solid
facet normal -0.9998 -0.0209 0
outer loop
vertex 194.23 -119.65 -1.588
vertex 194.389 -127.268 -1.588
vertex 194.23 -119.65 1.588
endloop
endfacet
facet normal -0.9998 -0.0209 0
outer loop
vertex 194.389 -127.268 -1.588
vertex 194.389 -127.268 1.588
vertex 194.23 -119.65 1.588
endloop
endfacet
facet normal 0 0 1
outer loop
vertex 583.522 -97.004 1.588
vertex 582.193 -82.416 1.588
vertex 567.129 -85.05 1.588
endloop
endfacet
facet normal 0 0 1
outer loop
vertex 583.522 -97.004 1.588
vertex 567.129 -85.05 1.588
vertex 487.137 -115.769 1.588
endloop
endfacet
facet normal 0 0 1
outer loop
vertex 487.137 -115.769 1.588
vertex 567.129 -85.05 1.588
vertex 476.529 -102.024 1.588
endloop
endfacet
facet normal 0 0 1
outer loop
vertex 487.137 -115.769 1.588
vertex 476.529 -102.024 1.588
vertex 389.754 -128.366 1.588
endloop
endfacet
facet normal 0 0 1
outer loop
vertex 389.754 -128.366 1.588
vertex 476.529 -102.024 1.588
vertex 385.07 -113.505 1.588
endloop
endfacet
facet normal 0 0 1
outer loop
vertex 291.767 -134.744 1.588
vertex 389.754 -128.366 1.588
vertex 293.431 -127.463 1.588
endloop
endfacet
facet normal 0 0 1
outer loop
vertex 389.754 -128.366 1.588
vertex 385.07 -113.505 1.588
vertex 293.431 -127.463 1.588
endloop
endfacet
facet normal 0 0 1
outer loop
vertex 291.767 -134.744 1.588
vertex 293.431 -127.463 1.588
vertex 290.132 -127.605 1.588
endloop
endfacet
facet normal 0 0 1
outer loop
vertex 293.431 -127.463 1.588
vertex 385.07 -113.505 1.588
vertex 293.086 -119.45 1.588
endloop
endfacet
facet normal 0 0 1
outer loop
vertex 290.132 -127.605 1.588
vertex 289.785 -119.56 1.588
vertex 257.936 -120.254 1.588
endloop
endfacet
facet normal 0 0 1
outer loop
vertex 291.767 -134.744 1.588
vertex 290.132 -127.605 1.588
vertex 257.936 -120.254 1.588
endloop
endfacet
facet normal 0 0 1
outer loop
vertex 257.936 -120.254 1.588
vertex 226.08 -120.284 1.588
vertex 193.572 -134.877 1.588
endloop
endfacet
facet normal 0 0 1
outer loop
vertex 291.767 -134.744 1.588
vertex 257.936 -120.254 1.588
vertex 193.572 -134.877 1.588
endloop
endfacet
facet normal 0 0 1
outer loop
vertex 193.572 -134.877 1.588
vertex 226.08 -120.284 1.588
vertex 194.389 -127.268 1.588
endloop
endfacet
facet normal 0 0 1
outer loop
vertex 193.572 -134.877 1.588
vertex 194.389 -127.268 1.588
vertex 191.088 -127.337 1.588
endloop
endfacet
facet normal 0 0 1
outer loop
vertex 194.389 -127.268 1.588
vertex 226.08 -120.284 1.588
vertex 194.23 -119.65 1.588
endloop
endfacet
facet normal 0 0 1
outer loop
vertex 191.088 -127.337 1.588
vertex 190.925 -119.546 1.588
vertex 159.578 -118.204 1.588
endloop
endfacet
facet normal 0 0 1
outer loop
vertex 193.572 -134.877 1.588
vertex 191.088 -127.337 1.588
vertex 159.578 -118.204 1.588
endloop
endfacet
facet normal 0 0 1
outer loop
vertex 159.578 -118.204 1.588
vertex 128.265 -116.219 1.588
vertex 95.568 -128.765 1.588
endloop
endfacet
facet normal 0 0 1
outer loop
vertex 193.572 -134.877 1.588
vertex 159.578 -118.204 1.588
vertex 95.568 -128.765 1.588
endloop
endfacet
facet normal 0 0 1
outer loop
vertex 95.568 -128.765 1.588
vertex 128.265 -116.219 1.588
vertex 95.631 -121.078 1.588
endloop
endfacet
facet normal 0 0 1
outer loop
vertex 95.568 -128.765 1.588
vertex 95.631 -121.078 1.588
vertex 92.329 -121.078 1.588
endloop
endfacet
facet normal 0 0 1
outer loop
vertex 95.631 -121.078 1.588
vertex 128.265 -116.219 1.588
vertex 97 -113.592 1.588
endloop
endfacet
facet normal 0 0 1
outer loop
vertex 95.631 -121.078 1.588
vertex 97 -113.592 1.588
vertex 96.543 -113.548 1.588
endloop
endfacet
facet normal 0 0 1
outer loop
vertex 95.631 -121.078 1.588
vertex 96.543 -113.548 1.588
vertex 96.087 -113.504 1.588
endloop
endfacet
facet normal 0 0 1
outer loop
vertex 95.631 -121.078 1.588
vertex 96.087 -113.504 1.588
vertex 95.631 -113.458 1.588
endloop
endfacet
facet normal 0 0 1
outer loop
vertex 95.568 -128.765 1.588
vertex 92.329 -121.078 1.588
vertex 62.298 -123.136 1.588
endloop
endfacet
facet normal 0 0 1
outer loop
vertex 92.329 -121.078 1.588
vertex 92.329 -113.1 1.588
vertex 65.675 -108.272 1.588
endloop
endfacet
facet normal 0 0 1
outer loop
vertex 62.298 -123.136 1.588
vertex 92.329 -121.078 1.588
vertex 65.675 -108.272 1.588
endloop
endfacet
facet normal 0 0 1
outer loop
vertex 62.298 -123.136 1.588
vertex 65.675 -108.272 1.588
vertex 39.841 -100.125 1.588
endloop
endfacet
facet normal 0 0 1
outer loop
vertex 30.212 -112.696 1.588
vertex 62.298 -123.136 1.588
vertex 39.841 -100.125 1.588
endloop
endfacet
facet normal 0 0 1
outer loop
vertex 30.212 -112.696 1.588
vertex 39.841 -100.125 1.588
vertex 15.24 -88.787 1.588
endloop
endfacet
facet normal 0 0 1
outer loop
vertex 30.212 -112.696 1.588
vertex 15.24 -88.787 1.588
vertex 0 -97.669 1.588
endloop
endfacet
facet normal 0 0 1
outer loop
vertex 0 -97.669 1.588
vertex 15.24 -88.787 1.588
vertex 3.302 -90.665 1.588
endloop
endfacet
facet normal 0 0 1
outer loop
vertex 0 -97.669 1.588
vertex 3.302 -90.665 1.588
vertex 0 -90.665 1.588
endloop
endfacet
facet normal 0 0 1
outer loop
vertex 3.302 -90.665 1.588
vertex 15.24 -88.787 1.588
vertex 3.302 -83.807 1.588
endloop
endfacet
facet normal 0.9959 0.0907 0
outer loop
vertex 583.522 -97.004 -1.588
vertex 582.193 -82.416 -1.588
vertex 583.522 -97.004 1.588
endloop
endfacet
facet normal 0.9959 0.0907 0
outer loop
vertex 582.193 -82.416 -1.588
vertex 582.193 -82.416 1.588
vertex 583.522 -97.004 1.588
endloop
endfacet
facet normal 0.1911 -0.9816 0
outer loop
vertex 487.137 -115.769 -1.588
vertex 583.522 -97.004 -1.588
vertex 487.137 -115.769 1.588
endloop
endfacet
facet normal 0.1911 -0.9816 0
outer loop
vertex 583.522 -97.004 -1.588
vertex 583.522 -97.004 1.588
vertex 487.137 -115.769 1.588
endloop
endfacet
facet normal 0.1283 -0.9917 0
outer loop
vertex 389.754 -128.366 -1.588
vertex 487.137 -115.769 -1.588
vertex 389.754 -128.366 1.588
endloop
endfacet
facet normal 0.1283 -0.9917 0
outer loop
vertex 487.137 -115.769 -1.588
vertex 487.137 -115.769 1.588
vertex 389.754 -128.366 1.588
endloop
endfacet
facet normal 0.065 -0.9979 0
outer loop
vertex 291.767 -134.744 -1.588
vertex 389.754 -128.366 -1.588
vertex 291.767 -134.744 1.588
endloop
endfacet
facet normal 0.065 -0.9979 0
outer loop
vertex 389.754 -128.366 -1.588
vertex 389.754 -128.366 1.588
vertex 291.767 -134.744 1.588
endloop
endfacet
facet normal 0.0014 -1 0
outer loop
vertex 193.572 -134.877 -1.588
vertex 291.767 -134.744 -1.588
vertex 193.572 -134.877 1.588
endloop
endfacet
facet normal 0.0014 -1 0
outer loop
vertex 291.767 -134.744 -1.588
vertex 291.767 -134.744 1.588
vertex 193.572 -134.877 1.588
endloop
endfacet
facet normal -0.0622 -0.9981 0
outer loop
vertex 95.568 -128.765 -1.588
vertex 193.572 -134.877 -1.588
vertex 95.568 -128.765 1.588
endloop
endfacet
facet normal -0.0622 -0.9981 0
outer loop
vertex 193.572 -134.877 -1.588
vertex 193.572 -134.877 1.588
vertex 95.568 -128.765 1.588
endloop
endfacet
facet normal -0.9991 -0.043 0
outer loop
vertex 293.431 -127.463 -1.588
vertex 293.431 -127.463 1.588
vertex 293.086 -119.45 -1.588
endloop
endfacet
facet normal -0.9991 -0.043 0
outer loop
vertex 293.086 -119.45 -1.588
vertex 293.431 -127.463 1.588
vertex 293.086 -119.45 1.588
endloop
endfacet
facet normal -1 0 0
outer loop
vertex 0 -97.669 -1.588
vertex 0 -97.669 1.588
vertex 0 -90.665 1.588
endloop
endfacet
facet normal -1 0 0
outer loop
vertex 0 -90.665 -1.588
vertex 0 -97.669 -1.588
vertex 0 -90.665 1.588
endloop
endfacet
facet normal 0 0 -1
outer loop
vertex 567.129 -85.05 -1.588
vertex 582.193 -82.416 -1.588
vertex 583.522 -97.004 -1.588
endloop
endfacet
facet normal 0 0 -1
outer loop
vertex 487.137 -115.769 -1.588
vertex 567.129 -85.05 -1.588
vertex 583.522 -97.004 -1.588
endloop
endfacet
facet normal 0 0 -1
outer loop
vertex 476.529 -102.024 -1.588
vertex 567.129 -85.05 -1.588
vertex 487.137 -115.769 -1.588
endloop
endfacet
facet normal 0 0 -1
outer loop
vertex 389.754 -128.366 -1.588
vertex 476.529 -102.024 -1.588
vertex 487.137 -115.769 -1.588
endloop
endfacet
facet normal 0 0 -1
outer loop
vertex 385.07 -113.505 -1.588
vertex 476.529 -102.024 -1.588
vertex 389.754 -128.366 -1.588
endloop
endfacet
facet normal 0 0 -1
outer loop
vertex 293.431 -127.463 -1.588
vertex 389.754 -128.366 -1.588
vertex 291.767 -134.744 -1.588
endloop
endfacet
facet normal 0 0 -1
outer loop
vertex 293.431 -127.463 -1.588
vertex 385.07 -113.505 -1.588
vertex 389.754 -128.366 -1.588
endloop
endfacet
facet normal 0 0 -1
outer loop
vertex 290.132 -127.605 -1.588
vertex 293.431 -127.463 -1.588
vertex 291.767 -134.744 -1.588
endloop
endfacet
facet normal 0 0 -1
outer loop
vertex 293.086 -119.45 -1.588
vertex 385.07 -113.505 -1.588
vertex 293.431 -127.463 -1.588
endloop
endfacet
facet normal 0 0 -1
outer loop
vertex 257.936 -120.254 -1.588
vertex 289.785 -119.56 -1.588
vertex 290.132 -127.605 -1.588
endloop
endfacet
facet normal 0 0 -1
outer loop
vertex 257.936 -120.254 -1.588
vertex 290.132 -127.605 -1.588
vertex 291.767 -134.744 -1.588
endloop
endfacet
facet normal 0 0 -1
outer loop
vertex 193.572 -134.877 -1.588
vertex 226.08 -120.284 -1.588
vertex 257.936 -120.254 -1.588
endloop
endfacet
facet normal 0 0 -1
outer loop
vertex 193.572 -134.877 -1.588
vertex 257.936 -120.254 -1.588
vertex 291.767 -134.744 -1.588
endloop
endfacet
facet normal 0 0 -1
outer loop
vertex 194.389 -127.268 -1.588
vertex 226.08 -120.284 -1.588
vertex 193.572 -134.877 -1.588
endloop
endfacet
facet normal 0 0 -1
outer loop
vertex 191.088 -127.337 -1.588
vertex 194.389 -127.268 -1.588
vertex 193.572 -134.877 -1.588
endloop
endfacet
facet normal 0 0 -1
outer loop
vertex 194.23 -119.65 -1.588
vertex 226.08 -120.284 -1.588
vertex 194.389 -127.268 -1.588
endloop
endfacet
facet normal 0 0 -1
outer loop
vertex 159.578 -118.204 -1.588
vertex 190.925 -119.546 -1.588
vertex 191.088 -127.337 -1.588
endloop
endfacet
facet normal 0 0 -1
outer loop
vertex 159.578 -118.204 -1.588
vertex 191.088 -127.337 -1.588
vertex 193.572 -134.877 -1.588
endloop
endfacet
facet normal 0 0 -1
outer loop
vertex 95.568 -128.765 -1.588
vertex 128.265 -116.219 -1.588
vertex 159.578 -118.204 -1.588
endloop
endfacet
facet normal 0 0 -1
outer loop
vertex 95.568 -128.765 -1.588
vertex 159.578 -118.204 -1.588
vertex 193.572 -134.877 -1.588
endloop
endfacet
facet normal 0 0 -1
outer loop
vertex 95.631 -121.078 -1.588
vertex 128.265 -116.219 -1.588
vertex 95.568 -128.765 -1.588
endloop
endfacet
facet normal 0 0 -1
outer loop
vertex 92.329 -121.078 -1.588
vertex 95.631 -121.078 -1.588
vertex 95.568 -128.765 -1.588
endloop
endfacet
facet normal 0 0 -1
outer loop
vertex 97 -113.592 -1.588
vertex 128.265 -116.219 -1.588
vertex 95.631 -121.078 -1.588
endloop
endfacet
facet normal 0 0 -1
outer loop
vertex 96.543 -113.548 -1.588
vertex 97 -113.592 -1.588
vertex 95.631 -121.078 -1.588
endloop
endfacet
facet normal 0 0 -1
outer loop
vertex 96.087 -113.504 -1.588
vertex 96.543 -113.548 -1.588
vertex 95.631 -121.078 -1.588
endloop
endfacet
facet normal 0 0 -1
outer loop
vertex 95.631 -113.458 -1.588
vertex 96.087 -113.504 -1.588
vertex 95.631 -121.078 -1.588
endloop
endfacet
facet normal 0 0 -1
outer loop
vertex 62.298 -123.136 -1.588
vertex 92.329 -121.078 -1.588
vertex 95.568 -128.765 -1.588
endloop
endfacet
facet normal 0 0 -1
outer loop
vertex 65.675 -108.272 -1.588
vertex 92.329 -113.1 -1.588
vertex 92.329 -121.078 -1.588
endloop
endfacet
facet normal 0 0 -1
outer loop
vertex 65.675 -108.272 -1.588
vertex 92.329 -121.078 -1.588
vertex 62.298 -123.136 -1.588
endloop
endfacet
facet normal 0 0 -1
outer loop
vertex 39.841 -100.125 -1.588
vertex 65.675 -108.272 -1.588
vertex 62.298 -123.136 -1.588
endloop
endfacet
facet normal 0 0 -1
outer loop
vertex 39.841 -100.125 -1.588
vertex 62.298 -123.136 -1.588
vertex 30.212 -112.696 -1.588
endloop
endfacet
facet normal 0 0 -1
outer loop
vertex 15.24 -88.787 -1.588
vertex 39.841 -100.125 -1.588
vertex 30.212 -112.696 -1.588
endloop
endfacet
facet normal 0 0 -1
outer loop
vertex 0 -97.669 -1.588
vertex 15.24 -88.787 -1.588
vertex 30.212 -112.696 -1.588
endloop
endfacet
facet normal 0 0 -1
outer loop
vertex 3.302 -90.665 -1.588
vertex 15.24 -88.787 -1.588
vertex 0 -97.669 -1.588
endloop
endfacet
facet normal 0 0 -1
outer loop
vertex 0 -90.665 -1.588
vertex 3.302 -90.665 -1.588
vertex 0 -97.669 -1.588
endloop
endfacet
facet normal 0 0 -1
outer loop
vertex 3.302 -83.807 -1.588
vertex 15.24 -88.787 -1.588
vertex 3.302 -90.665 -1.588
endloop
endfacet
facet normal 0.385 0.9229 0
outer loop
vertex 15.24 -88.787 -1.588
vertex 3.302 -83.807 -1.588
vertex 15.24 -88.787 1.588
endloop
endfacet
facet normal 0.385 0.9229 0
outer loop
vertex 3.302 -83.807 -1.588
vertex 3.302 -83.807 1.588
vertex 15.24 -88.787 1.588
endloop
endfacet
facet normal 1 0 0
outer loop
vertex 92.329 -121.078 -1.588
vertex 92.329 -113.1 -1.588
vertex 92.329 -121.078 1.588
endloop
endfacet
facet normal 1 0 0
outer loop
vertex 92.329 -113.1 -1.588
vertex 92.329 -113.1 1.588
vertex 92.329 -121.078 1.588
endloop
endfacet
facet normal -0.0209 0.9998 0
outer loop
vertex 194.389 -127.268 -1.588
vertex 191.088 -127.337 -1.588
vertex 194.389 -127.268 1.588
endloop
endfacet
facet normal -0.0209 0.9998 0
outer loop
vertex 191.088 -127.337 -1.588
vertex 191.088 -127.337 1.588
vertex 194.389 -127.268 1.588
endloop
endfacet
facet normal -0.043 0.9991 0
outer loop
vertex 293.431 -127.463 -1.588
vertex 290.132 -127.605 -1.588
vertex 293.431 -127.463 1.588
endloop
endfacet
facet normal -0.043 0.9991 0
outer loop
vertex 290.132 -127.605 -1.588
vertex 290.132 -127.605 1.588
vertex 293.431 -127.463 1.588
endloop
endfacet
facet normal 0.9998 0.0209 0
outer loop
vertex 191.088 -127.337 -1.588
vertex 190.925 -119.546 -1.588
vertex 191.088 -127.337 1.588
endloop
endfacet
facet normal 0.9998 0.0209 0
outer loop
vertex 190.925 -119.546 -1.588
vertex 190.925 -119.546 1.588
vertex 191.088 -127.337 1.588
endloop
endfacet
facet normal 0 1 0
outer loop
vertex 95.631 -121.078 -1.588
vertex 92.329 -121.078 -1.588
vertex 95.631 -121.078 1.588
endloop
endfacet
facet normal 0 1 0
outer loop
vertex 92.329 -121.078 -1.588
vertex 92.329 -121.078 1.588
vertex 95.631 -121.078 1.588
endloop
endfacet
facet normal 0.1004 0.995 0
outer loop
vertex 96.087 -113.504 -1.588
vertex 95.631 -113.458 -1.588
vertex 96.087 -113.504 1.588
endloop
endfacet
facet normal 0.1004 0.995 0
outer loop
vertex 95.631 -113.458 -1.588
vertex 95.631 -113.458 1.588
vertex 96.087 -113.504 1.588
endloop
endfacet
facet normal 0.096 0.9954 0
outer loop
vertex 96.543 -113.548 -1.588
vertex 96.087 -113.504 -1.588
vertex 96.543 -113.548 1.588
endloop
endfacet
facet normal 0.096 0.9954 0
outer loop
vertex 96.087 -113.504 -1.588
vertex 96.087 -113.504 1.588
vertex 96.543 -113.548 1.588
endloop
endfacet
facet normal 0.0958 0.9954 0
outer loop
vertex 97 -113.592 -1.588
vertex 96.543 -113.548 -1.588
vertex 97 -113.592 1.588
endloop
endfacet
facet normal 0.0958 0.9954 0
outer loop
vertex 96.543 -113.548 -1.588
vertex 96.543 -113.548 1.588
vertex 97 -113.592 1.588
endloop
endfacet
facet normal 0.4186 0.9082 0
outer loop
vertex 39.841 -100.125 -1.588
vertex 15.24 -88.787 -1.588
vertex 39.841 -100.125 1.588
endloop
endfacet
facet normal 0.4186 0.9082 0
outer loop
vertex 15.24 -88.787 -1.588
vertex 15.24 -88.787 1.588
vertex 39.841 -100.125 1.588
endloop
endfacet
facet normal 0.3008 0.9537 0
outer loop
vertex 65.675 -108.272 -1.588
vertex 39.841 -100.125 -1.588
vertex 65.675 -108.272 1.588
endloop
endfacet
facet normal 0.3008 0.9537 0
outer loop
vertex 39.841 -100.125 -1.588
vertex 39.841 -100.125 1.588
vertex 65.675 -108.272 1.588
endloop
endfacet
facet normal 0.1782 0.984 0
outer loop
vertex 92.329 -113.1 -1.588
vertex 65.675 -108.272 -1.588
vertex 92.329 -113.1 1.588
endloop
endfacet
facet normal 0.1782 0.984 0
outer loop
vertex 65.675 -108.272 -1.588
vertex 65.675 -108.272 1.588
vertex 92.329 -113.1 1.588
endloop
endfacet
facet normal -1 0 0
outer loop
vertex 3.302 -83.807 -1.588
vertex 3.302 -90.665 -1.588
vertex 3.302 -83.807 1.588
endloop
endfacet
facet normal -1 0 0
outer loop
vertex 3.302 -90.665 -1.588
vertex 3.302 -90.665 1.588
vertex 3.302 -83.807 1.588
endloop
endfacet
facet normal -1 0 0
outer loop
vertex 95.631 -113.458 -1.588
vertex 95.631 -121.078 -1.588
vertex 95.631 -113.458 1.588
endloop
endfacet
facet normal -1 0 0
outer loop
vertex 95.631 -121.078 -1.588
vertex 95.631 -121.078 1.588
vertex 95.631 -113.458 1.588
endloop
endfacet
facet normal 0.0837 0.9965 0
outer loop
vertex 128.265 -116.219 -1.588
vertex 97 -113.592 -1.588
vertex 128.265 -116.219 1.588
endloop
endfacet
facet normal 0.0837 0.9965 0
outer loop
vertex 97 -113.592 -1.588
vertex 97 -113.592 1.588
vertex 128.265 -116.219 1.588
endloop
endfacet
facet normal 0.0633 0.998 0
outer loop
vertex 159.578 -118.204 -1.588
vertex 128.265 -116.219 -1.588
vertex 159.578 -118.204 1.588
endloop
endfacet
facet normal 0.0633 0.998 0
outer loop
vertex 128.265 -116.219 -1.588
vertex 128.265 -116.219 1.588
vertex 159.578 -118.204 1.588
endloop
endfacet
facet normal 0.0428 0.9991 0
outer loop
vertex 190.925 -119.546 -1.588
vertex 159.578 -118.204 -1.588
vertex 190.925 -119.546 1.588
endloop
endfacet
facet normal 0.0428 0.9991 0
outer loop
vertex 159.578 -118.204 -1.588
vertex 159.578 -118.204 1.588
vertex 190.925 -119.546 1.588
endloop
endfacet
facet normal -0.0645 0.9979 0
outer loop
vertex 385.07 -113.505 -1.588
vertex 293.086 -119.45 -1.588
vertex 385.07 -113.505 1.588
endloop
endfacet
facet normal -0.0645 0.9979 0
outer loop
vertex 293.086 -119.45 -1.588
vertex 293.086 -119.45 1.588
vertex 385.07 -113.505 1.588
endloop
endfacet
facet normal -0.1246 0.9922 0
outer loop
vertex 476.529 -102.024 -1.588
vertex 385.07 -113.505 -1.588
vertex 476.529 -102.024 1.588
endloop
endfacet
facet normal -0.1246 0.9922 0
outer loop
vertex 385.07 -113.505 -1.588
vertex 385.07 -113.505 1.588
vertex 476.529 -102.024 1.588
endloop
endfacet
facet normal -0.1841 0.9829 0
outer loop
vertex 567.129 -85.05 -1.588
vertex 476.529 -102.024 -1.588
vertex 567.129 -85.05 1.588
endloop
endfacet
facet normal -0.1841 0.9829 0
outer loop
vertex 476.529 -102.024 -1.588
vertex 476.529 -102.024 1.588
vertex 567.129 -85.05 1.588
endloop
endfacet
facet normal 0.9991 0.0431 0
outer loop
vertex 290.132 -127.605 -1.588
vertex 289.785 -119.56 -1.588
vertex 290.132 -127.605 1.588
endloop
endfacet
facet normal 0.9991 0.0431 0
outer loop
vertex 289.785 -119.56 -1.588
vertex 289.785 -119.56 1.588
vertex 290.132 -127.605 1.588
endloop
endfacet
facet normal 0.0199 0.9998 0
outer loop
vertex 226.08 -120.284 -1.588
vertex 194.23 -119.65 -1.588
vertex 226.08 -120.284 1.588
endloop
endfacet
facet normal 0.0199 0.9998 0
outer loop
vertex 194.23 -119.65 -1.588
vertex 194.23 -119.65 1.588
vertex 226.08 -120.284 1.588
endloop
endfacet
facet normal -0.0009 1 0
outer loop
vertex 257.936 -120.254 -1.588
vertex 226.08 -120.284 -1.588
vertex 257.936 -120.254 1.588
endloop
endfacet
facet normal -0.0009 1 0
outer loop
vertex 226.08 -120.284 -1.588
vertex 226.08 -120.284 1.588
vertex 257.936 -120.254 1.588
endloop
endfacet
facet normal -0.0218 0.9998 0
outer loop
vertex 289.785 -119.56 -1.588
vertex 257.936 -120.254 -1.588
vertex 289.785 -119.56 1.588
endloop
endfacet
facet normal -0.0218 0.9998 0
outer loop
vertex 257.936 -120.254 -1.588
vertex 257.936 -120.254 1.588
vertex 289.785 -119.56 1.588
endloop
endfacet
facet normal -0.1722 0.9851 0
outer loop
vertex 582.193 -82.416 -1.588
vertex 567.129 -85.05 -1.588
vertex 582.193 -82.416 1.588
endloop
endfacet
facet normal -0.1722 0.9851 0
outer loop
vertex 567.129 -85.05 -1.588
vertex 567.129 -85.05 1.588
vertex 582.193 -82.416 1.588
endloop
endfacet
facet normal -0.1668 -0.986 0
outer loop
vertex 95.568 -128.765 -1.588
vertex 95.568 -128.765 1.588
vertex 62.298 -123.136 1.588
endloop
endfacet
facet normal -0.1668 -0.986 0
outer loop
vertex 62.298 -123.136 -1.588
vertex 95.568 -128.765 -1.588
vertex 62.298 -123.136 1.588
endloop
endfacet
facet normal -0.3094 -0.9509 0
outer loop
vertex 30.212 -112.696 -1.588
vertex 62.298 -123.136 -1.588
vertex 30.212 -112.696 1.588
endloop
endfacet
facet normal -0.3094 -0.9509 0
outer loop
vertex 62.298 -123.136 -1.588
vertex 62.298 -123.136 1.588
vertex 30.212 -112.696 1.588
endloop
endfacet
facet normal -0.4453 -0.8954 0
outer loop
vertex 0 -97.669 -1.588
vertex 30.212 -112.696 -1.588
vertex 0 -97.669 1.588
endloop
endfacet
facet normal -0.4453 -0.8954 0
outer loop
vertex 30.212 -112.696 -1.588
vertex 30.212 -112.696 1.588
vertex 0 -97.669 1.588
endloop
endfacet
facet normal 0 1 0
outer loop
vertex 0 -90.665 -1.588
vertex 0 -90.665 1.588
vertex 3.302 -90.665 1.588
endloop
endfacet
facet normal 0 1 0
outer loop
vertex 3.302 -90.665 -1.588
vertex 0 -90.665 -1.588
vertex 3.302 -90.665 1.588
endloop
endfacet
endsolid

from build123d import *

# Parameters (mm, degrees)
BOSS_EXTRUDE1_DEPTH = 1.5875


with BuildPart() as part:
    # Sketch1 → Boss-Extrude1 (new, symmetric)
    with BuildSketch(Plane.XY):
        with BuildLine():
            Line((0, -90.664621669), (3.302, -90.664621669))
            Line((3.302, -90.664621669), (3.302, -83.806621669))
            Line((3.302, -83.806621669), (15.24, -88.786627106))
            ThreePointArc((15.24, -88.786627106), (52.629116117, -104.606478128), (92.329, -113.099587694))
            Line((92.329, -113.099587694), (92.329, -121.078455555))
            Line((92.329, -121.078455555), (95.631, -121.078455555))
            Line((95.631, -121.078455555), (95.631, -113.458455555))
            ThreePointArc((95.631, -113.458455555), (96.315178786, -113.526351883), (96.999571645, -113.59205528))
            ThreePointArc((96.999571645, -113.59205528), (143.916391113, -117.292313455), (190.924914267, -119.545890704))
            Line((190.924914267, -119.545890704), (191.088010164, -127.337201025))
            Line((191.088010164, -127.337201025), (194.389286946, -127.268095229))
            Line((194.389286946, -127.268095229), (194.229812033, -119.649764195))
            ThreePointArc((194.229812033, -119.649764195), (242.008318885, -120.352184929), (289.785425963, -119.560256171))
            Line((289.785425963, -119.560256171), (290.131623743, -127.604610112))
            Line((290.131623743, -127.604610112), (293.430570154, -127.462636259))
            Line((293.430570154, -127.462636259), (293.085752086, -119.450341713))
            ThreePointArc((293.085752086, -119.450341713), (430.886485092, -108.454741771), (567.129437002, -85.049543851))
            Line((567.129437002, -85.049543851), (582.192517176, -82.415688618))
            Line((582.192517176, -82.415688618), (583.522459193, -97.003520311))
            ThreePointArc((583.522459193, -97.003520311), (340.810991625, -132.334178874), (95.5675, -128.764621669))
            ThreePointArc((95.5675, -128.764621669), (46.062902856, -118.505679901), (0, -97.669173356))
            Line((0, -97.669173356), (0, -90.664621669))
        make_face()
    extrude(amount=BOSS_EXTRUDE1_DEPTH, both=True)


solid = part.part
